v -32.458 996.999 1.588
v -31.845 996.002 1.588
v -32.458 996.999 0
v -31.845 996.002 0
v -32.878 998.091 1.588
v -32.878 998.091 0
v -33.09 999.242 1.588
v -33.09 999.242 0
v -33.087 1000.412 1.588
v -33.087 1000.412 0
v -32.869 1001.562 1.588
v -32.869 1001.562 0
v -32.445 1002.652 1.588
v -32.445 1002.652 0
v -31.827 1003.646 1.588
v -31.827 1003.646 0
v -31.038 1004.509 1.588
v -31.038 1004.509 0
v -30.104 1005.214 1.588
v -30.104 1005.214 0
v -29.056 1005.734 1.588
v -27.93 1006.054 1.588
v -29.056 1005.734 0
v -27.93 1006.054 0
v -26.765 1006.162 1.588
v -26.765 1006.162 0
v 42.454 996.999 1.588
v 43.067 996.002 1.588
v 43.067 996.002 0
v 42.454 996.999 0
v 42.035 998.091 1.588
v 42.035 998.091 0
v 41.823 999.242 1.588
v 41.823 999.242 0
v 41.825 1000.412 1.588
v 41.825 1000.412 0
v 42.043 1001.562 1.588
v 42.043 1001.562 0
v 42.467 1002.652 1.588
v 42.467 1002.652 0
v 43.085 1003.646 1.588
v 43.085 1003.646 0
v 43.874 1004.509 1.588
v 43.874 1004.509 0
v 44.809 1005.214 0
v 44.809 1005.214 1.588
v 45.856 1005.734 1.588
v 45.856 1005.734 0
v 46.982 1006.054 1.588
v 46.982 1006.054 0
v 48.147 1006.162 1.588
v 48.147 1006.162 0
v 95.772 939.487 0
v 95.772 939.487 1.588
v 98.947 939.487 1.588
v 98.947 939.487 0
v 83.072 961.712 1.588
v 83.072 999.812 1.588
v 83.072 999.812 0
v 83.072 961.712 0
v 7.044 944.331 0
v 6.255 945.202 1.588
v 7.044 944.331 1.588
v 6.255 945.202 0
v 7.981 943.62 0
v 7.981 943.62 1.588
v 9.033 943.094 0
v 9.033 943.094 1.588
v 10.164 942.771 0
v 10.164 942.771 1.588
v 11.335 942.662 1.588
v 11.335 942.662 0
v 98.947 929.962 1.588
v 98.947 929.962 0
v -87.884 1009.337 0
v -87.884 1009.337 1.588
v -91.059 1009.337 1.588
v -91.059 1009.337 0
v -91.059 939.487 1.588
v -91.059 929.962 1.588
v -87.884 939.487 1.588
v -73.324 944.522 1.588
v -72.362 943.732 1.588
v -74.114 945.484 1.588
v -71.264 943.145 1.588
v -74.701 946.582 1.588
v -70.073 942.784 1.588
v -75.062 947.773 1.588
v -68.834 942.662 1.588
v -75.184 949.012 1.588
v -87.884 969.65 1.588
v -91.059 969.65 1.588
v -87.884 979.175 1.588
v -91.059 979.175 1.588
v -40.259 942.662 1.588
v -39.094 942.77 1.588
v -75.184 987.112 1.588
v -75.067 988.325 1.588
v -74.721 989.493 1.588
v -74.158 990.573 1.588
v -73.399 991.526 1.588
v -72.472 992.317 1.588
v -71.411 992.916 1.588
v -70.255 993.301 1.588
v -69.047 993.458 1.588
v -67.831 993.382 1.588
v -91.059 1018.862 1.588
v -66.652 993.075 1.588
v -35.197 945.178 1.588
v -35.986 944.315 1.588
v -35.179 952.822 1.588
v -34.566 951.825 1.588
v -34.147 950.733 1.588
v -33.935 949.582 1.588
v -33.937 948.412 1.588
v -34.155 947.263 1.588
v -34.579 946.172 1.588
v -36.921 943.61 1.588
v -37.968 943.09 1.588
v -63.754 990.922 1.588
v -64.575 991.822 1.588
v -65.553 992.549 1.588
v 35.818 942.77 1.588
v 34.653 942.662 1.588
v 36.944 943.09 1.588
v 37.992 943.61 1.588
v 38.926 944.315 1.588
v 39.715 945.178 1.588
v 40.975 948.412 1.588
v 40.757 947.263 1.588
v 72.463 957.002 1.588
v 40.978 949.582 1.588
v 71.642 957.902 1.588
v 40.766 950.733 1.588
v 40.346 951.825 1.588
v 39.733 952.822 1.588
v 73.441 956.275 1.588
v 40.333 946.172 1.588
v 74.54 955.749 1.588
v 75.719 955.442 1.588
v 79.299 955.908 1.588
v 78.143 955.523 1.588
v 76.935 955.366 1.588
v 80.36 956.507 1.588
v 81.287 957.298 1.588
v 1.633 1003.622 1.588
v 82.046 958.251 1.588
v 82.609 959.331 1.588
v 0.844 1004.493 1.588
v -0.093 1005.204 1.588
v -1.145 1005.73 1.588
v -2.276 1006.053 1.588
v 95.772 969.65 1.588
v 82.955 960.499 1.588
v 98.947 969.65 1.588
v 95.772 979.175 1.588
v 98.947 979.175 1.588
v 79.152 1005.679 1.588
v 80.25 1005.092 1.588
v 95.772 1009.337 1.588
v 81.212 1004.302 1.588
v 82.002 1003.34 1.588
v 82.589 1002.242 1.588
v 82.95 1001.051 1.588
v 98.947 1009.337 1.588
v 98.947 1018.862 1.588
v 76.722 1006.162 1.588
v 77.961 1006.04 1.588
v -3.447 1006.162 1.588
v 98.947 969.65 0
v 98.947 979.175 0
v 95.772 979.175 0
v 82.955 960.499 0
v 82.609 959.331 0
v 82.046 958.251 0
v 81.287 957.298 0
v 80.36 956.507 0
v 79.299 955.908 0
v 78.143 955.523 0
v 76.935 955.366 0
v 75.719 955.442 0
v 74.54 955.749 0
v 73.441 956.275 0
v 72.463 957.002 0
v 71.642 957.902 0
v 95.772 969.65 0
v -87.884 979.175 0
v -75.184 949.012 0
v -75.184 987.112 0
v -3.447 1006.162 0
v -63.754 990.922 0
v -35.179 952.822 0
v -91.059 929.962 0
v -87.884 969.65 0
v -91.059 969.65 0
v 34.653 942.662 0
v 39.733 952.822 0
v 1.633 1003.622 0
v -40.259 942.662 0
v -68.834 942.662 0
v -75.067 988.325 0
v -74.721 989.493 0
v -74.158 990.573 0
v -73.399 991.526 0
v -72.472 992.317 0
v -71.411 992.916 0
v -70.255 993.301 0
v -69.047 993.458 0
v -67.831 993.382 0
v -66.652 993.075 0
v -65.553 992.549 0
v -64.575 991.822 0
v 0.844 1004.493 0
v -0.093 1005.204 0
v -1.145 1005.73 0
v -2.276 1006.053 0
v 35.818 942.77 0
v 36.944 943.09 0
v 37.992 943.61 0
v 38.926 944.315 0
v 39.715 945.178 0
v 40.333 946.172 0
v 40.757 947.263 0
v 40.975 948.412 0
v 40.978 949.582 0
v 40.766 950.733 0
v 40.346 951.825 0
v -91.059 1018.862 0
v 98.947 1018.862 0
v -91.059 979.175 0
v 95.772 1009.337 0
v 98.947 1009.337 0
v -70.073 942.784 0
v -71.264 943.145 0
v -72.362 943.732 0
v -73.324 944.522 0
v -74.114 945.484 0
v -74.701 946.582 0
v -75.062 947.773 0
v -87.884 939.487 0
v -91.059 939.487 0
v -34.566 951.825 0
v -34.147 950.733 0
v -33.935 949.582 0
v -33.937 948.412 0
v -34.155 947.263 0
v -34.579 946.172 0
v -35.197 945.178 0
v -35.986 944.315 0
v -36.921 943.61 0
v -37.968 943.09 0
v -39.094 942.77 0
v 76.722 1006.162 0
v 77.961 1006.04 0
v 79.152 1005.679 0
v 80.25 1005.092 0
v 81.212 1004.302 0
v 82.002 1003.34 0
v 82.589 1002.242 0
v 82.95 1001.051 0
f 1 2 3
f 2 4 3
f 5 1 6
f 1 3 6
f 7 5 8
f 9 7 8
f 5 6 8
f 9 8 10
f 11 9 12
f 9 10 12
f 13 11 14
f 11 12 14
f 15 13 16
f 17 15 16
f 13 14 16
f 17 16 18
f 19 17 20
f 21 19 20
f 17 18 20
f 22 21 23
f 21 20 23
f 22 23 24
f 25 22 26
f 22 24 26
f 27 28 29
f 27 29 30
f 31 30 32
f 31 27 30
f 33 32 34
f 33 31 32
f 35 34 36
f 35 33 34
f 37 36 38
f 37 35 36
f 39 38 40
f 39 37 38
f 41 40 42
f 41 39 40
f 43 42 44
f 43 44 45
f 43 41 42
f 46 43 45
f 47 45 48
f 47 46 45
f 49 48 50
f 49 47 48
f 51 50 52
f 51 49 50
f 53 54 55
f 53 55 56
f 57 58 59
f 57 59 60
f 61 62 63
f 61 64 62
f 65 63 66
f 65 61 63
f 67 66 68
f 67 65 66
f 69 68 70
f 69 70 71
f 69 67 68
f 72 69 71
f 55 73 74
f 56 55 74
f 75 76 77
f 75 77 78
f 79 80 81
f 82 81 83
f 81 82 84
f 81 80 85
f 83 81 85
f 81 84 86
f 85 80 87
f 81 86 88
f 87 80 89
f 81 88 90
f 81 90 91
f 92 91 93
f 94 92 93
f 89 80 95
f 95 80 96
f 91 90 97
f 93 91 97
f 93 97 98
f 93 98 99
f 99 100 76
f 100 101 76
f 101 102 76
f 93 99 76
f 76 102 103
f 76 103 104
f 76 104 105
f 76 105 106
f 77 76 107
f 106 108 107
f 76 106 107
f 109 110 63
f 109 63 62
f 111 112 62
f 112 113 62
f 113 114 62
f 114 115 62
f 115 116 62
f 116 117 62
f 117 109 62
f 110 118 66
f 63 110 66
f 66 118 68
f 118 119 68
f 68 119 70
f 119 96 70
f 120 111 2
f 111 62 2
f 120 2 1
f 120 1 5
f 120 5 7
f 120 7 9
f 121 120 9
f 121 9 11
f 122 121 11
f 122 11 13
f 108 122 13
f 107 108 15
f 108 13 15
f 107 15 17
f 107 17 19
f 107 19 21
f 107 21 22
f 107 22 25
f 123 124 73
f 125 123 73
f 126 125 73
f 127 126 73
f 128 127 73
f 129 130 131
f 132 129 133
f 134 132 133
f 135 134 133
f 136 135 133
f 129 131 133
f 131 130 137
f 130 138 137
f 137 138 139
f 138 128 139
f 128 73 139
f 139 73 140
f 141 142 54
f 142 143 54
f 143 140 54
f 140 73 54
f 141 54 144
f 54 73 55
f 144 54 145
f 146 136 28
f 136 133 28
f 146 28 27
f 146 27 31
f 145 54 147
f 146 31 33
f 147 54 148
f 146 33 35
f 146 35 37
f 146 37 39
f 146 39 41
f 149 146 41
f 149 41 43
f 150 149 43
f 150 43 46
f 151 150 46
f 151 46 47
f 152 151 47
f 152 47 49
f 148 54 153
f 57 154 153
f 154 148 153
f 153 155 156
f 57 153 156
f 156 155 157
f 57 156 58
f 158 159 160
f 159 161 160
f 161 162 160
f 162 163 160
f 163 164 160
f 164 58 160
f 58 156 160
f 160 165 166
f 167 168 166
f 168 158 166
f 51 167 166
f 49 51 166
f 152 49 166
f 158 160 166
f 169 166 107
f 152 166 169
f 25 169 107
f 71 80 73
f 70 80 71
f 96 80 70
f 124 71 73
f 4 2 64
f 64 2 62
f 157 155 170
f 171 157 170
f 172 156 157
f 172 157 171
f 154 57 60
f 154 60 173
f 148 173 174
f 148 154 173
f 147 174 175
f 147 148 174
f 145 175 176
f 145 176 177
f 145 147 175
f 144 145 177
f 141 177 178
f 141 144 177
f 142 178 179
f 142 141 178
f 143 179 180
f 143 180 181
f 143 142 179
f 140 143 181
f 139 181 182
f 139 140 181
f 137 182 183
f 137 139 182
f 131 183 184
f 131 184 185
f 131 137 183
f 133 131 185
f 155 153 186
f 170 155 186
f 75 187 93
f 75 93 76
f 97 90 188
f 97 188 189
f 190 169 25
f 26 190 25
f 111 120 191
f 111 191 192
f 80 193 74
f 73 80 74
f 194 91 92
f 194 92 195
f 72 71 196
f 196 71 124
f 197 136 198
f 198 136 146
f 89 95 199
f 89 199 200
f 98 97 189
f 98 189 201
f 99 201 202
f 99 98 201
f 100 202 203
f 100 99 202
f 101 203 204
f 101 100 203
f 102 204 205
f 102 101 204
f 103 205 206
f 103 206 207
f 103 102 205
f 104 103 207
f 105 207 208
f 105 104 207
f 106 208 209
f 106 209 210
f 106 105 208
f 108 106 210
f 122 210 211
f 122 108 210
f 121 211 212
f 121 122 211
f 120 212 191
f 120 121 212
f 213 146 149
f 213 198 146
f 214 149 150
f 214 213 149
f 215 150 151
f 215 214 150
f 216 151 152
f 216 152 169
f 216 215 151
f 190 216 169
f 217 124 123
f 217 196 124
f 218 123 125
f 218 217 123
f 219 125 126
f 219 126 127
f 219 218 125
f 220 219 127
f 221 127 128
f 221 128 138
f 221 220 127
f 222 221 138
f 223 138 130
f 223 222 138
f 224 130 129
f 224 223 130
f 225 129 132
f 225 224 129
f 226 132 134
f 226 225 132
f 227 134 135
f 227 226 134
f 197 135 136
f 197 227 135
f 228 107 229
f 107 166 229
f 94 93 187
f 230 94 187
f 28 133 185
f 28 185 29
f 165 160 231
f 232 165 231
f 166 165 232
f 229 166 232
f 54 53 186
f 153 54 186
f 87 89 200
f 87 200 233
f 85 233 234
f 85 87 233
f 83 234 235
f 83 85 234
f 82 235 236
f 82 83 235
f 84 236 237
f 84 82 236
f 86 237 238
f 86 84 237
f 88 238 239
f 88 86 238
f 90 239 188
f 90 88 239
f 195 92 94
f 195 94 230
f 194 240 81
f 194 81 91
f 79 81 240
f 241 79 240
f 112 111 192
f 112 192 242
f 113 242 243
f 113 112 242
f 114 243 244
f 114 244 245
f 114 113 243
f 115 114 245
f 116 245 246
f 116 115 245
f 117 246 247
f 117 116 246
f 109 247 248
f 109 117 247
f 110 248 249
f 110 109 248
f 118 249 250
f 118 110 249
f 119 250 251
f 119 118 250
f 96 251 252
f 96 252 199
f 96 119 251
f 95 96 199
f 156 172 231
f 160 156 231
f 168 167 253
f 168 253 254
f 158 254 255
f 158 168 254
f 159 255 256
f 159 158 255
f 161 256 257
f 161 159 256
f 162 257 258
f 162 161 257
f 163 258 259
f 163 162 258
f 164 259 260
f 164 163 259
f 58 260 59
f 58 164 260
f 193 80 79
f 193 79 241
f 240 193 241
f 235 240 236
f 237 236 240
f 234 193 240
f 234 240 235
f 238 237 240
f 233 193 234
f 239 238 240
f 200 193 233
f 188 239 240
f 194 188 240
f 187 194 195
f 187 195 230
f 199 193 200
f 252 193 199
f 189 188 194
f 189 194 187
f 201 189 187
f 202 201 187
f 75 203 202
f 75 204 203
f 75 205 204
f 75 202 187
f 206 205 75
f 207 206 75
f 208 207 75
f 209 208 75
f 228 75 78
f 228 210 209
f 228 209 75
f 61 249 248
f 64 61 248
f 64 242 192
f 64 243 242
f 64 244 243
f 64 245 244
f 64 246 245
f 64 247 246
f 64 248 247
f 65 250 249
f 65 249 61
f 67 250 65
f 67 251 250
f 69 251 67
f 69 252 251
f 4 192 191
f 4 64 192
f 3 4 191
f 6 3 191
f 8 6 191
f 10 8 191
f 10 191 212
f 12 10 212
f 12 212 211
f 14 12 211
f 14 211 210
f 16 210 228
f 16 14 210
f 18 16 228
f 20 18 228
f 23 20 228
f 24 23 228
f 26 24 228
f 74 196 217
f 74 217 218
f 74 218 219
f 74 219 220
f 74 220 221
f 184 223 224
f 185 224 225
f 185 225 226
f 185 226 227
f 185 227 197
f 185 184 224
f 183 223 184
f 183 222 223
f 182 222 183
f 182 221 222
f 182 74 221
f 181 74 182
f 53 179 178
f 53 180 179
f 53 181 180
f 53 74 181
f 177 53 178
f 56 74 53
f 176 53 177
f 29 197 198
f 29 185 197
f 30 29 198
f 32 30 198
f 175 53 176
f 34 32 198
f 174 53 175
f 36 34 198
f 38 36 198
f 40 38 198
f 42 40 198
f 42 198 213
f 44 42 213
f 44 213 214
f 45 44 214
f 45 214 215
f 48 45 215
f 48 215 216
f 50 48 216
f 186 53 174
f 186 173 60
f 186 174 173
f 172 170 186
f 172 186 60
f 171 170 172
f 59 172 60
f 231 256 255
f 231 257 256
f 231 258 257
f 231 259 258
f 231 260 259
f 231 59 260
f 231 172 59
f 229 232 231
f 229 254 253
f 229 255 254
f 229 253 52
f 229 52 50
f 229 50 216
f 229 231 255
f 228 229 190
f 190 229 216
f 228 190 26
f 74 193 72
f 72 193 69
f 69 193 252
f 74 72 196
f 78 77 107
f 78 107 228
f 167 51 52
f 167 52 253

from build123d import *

# Parameters (mm, degrees)
SKETCH1_W           = 183.656
SKETCH1_H           = 88.9
BOSS_EXTRUDE1_DEPTH = 1.5875
CUT_EXTRUDE1_DEPTH  = 1.5875
FILLET1_R           = 6.35
SKETCH3_W           = 1.5875
SKETCH3_H           = 9.525
BOSS_EXTRUDE2_DEPTH = 3.175


with BuildPart() as part:
    # Sketch1 → Boss-Extrude1 (new body)
    with BuildSketch(Plane.XY):
        with Locations((3.944, 974.412014871)):
            Rectangle(SKETCH1_W, SKETCH1_H)
    extrude(amount=BOSS_EXTRUDE1_DEPTH)

    # Sketch2 → Cut-Extrude1 (cut)
    with BuildSketch(Plane.XY.offset(1.5875)):
        with BuildLine():
            Line((-63.754, 990.922014871), (-35.179, 952.822014871))
            ThreePointArc((-35.179, 952.822014871), (-34.579387337, 946.172208539), (-40.259, 942.662014871))
            Line((-40.259, 942.662014871), (-68.834, 942.662014871))
            ThreePointArc((-68.834, 942.662014871), (-73.324128061, 944.52188681), (-75.184, 949.012014871))
            Line((-75.184, 949.012014871), (-75.184, 987.112014871))
            ThreePointArc((-75.184, 987.112014871), (-70.842046314, 993.136153813), (-63.754, 990.922014871))
        make_face()
        with BuildLine():
            Line((71.642, 957.902014871), (43.067, 996.002014871))
            ThreePointArc((43.067, 996.002014871), (42.467387337, 1002.651821202), (48.147, 1006.162014871))
            Line((48.147, 1006.162014871), (76.722, 1006.162014871))
            ThreePointArc((76.722, 1006.162014871), (81.212128061, 1004.302142931), (83.072, 999.812014871))
            Line((83.072, 999.812014871), (83.072, 961.712014871))
            ThreePointArc((83.072, 961.712014871), (78.730046314, 955.687875928), (71.642, 957.902014871))
        make_face()
        Polygon((-39.46525, 1006.162014871), (8.15975, 942.662014871), (47.35325, 942.662014871), (-0.27175, 1006.162014871), align=None)
    extrude(amount=-CUT_EXTRUDE1_DEPTH, mode=Mode.SUBTRACT)

    # Fillet1
    fillet1_edges = [part.edges().sort_by_distance(p)[0] for p in [
        (8.15975, 942.662014871, 0.79375),
        (-39.46525, 1006.162014871, 0.79375),
        (-0.27175, 1006.162014871, 0.79375),
        (47.35325, 942.662014871, 0.79375),
    ]]
    fillet(fillet1_edges, radius=FILLET1_R)

    # Sketch3 → Boss-Extrude2 (add)
    with BuildSketch(Plane(origin=(95.772, 0, 0), x_dir=(0, 0, -1), z_dir=(1, 0, 0))):
        with Locations((-0.79375, 1014.099514871)):
            Rectangle(SKETCH3_W, SKETCH3_H)
        with Locations((-0.79375, 934.724514871)):
            Rectangle(SKETCH3_W, SKETCH3_H)
        with Locations((-0.79375, 974.412014871)):
            Rectangle(SKETCH3_W, SKETCH3_H)
    boss_extrude2 = extrude(amount=BOSS_EXTRUDE2_DEPTH)

    # Mirror2: Boss-Extrude2 across plane
    add(boss_extrude2.mirror(Plane(origin=(3.944, 0, 0), x_dir=(0, 0, 1), z_dir=(1, 0, 0))))


solid = part.part
